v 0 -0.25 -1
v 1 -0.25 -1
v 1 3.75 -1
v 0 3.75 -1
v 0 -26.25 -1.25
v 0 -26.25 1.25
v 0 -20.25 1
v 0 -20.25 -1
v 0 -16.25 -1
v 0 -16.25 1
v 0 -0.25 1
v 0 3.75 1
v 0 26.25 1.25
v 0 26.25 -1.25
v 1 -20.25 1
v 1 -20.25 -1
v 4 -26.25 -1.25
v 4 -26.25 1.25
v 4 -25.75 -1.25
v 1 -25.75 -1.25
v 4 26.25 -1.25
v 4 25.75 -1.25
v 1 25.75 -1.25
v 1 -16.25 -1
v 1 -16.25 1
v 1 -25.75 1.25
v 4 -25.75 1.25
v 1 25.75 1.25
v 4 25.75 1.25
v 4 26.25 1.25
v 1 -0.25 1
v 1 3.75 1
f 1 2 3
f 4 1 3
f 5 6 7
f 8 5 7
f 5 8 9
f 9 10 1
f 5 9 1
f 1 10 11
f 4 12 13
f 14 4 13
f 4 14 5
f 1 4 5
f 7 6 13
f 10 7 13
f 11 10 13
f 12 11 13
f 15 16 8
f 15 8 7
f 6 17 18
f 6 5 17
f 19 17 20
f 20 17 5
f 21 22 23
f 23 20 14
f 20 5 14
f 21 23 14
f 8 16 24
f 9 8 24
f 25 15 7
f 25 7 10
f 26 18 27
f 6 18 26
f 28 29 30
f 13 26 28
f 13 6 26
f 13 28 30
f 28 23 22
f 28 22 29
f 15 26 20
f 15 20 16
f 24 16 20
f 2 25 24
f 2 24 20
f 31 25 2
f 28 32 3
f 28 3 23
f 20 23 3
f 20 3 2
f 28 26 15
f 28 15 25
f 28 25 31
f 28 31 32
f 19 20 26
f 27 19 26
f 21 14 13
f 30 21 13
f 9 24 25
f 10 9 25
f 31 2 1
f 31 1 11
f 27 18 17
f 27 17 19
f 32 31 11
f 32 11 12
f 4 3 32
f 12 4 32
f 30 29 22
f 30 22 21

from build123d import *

# Parameters (mm, degrees)
F0_W     = 52.5
F0_H     = 2.5
F1_DEPTH = 1
F2_W     = 0.5
F2_H     = 2.5
F3_DEPTH = 3
F4_W     = 4
F4_H     = 2
F5_DEPTH = 1


with BuildPart() as f1:
    # F0 (on Right) → F1 (new body)
    with BuildSketch(Plane.YZ):
        Rectangle(F0_W, F0_H)
    extrude(amount=F1_DEPTH)

    # F2 (on face) → F3 (join)
    with BuildSketch(Plane.YZ.offset(1)):
        with Locations((-26, 0)):
            Rectangle(F2_W, F2_H)
        with Locations((26, 0)):
            Rectangle(F2_W, F2_H)
    extrude(amount=F3_DEPTH)

    # F4 (on face) → F5 (cut, through all)
    with BuildSketch(Plane.YZ.offset(1)):
        with Locations((-18.25, 0)):
            Rectangle(F4_W, F4_H)
        with Locations((1.75, 0)):
            Rectangle(F4_W, F4_H)
    extrude(amount=-F5_DEPTH, mode=Mode.SUBTRACT)


solid = f1.part
